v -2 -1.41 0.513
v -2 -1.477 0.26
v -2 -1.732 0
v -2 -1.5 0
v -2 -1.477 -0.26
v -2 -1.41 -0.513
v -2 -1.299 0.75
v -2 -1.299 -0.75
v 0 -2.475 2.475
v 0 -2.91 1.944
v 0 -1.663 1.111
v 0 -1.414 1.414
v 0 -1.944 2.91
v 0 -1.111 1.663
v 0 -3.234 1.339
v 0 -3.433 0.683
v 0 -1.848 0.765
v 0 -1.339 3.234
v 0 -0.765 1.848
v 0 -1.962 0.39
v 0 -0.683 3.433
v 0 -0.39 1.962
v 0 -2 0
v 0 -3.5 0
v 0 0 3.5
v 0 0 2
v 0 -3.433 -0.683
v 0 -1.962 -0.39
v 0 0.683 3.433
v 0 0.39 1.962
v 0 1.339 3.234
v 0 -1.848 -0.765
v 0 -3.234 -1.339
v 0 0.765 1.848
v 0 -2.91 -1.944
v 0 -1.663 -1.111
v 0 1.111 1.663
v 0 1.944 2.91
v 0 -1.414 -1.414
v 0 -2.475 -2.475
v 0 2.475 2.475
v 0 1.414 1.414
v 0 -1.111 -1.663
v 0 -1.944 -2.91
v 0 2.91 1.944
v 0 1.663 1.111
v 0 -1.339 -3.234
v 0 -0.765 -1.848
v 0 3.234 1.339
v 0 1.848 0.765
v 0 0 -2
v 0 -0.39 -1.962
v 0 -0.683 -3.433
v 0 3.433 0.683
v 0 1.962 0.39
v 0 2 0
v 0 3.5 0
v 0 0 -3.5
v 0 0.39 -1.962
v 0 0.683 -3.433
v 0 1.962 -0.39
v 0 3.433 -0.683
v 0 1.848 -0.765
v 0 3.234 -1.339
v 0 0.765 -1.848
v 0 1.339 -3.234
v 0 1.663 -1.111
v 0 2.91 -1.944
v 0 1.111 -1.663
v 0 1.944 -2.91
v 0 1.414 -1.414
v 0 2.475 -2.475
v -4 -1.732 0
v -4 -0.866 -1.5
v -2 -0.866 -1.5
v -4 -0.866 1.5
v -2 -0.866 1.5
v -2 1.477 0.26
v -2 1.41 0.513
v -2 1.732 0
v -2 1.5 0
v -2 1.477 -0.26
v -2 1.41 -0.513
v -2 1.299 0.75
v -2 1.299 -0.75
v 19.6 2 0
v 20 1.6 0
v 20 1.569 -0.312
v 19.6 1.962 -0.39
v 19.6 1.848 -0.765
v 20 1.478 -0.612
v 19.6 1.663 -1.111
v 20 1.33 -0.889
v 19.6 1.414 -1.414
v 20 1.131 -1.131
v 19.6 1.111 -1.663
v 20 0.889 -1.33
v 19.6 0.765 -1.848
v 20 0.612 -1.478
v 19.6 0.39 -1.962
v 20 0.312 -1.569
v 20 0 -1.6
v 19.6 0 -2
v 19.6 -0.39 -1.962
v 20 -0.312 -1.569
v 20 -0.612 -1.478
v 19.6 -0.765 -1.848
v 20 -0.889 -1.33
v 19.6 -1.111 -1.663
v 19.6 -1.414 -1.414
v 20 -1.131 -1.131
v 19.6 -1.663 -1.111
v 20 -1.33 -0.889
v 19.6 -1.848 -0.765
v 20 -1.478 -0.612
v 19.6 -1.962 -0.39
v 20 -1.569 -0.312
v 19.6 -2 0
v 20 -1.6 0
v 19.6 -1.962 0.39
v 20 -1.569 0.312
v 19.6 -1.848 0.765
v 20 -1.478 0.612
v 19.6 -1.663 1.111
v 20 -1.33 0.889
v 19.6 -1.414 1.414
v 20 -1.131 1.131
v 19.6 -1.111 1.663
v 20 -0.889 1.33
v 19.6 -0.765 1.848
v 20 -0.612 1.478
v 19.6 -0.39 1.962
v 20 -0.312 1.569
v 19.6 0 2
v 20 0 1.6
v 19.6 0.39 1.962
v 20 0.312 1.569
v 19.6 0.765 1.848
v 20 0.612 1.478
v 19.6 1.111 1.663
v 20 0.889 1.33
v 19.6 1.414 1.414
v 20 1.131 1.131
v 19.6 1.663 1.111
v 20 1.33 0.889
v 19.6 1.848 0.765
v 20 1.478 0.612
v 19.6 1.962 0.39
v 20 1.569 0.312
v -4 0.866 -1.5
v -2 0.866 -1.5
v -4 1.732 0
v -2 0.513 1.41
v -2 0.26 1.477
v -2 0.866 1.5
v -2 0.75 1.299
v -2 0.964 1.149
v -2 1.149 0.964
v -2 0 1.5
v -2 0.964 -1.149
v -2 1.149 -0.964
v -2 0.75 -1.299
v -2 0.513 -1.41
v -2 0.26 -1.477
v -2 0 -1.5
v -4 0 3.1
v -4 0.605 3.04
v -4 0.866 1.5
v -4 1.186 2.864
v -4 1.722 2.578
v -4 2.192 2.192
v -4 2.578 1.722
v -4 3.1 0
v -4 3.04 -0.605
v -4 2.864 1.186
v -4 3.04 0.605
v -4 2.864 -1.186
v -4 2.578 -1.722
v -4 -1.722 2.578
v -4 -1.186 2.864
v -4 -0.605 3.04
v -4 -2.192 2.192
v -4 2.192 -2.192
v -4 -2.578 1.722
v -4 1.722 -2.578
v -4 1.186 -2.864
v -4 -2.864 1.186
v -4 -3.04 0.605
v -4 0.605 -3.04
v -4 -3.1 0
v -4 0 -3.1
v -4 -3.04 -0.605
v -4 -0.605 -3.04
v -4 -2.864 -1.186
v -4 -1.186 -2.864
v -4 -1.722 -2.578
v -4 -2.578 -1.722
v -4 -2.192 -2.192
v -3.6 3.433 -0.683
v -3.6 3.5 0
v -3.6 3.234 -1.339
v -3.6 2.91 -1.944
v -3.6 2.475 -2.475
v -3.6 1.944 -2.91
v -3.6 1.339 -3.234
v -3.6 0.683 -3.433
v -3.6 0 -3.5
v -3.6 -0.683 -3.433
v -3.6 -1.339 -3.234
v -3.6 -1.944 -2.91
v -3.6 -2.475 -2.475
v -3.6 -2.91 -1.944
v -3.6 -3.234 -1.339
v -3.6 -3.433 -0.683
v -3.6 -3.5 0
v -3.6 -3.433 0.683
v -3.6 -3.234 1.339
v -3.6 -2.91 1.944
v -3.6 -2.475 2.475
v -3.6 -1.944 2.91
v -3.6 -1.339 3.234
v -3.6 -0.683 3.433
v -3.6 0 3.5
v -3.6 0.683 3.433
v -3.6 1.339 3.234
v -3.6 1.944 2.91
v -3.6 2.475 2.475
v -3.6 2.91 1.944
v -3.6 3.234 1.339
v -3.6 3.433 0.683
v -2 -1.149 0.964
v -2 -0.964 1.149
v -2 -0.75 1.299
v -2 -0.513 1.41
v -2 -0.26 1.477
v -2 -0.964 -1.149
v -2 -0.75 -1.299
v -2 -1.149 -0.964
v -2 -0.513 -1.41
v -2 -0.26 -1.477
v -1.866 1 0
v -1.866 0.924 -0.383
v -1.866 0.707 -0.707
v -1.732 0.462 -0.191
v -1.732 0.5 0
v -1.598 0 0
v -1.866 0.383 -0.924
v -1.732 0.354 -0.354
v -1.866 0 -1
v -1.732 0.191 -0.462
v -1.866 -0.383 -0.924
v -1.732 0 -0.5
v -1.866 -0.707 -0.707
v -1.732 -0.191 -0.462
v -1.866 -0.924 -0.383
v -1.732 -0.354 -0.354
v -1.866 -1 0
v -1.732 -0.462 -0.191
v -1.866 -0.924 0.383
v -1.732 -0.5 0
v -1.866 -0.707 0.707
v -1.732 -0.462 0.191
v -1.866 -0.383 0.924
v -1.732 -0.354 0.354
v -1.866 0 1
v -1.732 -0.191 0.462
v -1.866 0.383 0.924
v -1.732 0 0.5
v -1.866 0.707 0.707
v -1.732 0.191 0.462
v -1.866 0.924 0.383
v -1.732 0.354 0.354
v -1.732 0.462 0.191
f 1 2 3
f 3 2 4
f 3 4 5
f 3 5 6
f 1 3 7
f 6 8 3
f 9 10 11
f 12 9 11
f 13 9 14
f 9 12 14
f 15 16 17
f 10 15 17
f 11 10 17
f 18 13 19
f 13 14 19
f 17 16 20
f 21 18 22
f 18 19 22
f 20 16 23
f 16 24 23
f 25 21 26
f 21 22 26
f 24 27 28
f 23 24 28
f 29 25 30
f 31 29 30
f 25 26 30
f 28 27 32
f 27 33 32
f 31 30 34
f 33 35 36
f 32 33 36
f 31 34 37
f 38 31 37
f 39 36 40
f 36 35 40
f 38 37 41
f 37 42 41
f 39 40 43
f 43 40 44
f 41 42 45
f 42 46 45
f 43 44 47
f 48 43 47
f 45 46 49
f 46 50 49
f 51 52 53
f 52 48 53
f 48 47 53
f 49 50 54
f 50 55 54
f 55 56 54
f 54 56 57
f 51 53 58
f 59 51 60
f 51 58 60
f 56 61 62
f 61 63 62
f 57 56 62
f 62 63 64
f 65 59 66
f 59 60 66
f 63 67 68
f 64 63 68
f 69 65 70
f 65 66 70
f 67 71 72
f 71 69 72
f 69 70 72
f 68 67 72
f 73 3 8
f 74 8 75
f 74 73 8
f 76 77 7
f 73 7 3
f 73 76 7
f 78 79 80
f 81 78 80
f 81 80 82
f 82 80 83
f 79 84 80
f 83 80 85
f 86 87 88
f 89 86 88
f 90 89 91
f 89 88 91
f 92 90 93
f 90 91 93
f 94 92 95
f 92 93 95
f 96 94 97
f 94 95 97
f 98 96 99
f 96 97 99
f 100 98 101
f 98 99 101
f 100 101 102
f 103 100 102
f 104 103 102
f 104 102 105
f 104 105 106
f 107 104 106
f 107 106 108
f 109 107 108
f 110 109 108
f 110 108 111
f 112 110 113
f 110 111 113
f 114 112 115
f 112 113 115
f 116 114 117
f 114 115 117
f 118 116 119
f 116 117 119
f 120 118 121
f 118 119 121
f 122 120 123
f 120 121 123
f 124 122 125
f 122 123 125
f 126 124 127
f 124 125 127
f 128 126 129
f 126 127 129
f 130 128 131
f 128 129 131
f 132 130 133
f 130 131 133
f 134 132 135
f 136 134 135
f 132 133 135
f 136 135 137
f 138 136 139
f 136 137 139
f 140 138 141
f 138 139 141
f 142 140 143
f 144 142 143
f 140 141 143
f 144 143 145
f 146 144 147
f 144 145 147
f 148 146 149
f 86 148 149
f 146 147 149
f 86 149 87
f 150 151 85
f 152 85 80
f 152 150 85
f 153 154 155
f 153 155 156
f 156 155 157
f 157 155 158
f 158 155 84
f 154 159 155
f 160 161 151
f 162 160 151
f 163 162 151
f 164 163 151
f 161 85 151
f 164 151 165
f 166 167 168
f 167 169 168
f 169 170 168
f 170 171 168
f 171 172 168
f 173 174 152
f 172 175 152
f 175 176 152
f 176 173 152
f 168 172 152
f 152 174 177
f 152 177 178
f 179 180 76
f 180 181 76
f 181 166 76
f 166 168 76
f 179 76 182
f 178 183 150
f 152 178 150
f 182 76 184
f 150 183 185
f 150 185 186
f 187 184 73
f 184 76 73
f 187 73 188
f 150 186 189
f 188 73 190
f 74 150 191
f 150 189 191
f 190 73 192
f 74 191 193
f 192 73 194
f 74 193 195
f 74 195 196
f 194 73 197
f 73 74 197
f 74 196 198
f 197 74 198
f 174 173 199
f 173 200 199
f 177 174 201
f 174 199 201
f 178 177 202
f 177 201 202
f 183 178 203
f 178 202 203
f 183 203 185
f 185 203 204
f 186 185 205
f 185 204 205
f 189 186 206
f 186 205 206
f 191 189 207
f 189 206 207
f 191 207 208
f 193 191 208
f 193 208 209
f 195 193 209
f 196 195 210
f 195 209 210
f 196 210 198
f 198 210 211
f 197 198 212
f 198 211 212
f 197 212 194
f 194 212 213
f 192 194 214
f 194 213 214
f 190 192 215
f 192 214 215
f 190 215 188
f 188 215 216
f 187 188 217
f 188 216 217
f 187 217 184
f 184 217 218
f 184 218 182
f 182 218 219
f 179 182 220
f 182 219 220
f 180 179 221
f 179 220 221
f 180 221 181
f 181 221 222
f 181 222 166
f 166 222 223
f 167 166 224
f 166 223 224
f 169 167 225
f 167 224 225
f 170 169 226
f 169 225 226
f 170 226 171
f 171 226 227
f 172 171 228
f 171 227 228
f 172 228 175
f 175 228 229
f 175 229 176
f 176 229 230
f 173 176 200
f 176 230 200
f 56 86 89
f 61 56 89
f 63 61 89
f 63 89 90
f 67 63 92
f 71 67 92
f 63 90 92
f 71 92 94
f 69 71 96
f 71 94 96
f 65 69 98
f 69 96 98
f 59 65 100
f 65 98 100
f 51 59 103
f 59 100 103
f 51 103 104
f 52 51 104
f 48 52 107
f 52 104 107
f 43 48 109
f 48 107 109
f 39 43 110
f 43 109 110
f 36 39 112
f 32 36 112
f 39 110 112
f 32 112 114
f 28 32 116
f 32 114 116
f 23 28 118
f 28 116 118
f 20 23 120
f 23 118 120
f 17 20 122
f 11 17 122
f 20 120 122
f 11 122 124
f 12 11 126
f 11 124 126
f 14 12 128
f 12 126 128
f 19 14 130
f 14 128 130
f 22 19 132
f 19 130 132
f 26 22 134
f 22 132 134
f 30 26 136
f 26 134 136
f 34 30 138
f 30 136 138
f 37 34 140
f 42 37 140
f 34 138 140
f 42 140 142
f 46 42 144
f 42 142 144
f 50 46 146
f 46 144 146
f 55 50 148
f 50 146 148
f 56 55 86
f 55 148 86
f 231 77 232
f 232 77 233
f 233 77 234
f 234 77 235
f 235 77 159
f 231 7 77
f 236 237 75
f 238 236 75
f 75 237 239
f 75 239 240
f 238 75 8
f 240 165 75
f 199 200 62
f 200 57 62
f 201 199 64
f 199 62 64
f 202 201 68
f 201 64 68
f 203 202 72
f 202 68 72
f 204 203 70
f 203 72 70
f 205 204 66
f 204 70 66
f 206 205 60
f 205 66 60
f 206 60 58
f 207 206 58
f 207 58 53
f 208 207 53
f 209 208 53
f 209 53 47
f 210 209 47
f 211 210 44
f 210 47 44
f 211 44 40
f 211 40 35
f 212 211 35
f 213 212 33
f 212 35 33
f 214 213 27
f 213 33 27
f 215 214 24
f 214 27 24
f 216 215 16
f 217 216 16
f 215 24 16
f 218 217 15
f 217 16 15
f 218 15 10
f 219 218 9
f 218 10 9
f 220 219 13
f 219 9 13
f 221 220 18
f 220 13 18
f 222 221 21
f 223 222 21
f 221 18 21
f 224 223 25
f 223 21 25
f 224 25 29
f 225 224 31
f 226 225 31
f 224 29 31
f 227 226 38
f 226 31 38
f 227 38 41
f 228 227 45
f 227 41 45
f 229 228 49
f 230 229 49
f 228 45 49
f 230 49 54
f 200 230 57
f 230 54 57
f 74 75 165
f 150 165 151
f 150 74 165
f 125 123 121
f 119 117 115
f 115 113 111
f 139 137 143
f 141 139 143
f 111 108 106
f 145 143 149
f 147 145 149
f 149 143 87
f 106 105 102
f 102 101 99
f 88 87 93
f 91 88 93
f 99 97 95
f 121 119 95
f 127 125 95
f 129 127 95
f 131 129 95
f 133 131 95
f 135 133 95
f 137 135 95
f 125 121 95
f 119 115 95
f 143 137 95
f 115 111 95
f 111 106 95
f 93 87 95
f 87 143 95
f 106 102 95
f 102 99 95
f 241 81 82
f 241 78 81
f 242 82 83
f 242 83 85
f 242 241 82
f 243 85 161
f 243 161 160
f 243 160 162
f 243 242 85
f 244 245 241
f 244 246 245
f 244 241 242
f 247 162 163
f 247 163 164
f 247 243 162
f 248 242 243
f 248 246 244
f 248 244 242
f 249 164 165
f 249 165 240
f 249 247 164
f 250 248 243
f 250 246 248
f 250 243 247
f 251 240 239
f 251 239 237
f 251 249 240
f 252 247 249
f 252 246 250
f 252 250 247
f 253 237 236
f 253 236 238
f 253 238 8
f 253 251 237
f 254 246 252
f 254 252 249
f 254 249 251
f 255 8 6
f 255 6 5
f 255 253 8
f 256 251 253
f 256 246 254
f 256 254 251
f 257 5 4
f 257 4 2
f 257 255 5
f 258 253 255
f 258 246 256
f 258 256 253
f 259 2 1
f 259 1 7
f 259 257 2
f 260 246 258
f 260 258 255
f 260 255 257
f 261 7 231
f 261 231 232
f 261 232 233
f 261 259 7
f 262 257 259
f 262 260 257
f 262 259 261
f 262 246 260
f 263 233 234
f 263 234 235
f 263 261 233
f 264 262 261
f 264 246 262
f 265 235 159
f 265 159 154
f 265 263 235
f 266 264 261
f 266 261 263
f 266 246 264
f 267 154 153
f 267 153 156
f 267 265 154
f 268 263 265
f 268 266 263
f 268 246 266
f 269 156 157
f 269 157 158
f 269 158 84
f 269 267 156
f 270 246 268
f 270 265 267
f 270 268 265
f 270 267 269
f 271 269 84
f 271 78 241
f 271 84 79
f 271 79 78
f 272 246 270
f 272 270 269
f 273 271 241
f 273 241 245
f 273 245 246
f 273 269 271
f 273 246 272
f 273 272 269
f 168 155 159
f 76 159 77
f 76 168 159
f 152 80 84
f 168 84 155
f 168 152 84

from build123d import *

# Parameters (mm, degrees)
CHAMFER1_SIZE      = 0.4
CUT_EXTRUDE1_DEPTH = 2


with BuildPart() as part:
    # Sketch1 → Revolve1 (revolve)
    with BuildSketch(Plane.XY):
        Polygon((-4, 0), (-4, 3.1), (-3.6, 3.5), (0, 3.5), (0, 2), (20, 2), (20, 0), align=None)
    revolve(axis=Axis((20, 0, 0), (-1, 0, 0)))

    # Chamfer1
    chamfer1_edges = [part.edges().sort_by_distance(p)[0] for p in [
        (20, -2, 0),
    ]]
    chamfer(chamfer1_edges, length=CHAMFER1_SIZE)

    # Sketch2 → Cut-Revolve1 (revolve, cut)
    with BuildSketch(Plane.XY):
        Polygon((-4, 0), (-4, 1.5), (-2, 1.5), (-1.598076211, 0), align=None)
    revolve(axis=Axis((-1.598076211, 0, 0), (-1, 0, 0)), mode=Mode.SUBTRACT)

    # Sketch3 → Cut-Extrude1 (cut)
    with BuildSketch(Plane(origin=(-4, 0, 0), x_dir=(0, 0, -1), z_dir=(1, 0, 0))):
        Polygon((-1.5, 0.866025404), (-1.5, -0.866025404), (0, -1.732050808), (1.5, -0.866025404), (1.5, 0.866025404), (0, 1.732050808), align=None)
    extrude(amount=CUT_EXTRUDE1_DEPTH, mode=Mode.SUBTRACT)


solid = part.part
